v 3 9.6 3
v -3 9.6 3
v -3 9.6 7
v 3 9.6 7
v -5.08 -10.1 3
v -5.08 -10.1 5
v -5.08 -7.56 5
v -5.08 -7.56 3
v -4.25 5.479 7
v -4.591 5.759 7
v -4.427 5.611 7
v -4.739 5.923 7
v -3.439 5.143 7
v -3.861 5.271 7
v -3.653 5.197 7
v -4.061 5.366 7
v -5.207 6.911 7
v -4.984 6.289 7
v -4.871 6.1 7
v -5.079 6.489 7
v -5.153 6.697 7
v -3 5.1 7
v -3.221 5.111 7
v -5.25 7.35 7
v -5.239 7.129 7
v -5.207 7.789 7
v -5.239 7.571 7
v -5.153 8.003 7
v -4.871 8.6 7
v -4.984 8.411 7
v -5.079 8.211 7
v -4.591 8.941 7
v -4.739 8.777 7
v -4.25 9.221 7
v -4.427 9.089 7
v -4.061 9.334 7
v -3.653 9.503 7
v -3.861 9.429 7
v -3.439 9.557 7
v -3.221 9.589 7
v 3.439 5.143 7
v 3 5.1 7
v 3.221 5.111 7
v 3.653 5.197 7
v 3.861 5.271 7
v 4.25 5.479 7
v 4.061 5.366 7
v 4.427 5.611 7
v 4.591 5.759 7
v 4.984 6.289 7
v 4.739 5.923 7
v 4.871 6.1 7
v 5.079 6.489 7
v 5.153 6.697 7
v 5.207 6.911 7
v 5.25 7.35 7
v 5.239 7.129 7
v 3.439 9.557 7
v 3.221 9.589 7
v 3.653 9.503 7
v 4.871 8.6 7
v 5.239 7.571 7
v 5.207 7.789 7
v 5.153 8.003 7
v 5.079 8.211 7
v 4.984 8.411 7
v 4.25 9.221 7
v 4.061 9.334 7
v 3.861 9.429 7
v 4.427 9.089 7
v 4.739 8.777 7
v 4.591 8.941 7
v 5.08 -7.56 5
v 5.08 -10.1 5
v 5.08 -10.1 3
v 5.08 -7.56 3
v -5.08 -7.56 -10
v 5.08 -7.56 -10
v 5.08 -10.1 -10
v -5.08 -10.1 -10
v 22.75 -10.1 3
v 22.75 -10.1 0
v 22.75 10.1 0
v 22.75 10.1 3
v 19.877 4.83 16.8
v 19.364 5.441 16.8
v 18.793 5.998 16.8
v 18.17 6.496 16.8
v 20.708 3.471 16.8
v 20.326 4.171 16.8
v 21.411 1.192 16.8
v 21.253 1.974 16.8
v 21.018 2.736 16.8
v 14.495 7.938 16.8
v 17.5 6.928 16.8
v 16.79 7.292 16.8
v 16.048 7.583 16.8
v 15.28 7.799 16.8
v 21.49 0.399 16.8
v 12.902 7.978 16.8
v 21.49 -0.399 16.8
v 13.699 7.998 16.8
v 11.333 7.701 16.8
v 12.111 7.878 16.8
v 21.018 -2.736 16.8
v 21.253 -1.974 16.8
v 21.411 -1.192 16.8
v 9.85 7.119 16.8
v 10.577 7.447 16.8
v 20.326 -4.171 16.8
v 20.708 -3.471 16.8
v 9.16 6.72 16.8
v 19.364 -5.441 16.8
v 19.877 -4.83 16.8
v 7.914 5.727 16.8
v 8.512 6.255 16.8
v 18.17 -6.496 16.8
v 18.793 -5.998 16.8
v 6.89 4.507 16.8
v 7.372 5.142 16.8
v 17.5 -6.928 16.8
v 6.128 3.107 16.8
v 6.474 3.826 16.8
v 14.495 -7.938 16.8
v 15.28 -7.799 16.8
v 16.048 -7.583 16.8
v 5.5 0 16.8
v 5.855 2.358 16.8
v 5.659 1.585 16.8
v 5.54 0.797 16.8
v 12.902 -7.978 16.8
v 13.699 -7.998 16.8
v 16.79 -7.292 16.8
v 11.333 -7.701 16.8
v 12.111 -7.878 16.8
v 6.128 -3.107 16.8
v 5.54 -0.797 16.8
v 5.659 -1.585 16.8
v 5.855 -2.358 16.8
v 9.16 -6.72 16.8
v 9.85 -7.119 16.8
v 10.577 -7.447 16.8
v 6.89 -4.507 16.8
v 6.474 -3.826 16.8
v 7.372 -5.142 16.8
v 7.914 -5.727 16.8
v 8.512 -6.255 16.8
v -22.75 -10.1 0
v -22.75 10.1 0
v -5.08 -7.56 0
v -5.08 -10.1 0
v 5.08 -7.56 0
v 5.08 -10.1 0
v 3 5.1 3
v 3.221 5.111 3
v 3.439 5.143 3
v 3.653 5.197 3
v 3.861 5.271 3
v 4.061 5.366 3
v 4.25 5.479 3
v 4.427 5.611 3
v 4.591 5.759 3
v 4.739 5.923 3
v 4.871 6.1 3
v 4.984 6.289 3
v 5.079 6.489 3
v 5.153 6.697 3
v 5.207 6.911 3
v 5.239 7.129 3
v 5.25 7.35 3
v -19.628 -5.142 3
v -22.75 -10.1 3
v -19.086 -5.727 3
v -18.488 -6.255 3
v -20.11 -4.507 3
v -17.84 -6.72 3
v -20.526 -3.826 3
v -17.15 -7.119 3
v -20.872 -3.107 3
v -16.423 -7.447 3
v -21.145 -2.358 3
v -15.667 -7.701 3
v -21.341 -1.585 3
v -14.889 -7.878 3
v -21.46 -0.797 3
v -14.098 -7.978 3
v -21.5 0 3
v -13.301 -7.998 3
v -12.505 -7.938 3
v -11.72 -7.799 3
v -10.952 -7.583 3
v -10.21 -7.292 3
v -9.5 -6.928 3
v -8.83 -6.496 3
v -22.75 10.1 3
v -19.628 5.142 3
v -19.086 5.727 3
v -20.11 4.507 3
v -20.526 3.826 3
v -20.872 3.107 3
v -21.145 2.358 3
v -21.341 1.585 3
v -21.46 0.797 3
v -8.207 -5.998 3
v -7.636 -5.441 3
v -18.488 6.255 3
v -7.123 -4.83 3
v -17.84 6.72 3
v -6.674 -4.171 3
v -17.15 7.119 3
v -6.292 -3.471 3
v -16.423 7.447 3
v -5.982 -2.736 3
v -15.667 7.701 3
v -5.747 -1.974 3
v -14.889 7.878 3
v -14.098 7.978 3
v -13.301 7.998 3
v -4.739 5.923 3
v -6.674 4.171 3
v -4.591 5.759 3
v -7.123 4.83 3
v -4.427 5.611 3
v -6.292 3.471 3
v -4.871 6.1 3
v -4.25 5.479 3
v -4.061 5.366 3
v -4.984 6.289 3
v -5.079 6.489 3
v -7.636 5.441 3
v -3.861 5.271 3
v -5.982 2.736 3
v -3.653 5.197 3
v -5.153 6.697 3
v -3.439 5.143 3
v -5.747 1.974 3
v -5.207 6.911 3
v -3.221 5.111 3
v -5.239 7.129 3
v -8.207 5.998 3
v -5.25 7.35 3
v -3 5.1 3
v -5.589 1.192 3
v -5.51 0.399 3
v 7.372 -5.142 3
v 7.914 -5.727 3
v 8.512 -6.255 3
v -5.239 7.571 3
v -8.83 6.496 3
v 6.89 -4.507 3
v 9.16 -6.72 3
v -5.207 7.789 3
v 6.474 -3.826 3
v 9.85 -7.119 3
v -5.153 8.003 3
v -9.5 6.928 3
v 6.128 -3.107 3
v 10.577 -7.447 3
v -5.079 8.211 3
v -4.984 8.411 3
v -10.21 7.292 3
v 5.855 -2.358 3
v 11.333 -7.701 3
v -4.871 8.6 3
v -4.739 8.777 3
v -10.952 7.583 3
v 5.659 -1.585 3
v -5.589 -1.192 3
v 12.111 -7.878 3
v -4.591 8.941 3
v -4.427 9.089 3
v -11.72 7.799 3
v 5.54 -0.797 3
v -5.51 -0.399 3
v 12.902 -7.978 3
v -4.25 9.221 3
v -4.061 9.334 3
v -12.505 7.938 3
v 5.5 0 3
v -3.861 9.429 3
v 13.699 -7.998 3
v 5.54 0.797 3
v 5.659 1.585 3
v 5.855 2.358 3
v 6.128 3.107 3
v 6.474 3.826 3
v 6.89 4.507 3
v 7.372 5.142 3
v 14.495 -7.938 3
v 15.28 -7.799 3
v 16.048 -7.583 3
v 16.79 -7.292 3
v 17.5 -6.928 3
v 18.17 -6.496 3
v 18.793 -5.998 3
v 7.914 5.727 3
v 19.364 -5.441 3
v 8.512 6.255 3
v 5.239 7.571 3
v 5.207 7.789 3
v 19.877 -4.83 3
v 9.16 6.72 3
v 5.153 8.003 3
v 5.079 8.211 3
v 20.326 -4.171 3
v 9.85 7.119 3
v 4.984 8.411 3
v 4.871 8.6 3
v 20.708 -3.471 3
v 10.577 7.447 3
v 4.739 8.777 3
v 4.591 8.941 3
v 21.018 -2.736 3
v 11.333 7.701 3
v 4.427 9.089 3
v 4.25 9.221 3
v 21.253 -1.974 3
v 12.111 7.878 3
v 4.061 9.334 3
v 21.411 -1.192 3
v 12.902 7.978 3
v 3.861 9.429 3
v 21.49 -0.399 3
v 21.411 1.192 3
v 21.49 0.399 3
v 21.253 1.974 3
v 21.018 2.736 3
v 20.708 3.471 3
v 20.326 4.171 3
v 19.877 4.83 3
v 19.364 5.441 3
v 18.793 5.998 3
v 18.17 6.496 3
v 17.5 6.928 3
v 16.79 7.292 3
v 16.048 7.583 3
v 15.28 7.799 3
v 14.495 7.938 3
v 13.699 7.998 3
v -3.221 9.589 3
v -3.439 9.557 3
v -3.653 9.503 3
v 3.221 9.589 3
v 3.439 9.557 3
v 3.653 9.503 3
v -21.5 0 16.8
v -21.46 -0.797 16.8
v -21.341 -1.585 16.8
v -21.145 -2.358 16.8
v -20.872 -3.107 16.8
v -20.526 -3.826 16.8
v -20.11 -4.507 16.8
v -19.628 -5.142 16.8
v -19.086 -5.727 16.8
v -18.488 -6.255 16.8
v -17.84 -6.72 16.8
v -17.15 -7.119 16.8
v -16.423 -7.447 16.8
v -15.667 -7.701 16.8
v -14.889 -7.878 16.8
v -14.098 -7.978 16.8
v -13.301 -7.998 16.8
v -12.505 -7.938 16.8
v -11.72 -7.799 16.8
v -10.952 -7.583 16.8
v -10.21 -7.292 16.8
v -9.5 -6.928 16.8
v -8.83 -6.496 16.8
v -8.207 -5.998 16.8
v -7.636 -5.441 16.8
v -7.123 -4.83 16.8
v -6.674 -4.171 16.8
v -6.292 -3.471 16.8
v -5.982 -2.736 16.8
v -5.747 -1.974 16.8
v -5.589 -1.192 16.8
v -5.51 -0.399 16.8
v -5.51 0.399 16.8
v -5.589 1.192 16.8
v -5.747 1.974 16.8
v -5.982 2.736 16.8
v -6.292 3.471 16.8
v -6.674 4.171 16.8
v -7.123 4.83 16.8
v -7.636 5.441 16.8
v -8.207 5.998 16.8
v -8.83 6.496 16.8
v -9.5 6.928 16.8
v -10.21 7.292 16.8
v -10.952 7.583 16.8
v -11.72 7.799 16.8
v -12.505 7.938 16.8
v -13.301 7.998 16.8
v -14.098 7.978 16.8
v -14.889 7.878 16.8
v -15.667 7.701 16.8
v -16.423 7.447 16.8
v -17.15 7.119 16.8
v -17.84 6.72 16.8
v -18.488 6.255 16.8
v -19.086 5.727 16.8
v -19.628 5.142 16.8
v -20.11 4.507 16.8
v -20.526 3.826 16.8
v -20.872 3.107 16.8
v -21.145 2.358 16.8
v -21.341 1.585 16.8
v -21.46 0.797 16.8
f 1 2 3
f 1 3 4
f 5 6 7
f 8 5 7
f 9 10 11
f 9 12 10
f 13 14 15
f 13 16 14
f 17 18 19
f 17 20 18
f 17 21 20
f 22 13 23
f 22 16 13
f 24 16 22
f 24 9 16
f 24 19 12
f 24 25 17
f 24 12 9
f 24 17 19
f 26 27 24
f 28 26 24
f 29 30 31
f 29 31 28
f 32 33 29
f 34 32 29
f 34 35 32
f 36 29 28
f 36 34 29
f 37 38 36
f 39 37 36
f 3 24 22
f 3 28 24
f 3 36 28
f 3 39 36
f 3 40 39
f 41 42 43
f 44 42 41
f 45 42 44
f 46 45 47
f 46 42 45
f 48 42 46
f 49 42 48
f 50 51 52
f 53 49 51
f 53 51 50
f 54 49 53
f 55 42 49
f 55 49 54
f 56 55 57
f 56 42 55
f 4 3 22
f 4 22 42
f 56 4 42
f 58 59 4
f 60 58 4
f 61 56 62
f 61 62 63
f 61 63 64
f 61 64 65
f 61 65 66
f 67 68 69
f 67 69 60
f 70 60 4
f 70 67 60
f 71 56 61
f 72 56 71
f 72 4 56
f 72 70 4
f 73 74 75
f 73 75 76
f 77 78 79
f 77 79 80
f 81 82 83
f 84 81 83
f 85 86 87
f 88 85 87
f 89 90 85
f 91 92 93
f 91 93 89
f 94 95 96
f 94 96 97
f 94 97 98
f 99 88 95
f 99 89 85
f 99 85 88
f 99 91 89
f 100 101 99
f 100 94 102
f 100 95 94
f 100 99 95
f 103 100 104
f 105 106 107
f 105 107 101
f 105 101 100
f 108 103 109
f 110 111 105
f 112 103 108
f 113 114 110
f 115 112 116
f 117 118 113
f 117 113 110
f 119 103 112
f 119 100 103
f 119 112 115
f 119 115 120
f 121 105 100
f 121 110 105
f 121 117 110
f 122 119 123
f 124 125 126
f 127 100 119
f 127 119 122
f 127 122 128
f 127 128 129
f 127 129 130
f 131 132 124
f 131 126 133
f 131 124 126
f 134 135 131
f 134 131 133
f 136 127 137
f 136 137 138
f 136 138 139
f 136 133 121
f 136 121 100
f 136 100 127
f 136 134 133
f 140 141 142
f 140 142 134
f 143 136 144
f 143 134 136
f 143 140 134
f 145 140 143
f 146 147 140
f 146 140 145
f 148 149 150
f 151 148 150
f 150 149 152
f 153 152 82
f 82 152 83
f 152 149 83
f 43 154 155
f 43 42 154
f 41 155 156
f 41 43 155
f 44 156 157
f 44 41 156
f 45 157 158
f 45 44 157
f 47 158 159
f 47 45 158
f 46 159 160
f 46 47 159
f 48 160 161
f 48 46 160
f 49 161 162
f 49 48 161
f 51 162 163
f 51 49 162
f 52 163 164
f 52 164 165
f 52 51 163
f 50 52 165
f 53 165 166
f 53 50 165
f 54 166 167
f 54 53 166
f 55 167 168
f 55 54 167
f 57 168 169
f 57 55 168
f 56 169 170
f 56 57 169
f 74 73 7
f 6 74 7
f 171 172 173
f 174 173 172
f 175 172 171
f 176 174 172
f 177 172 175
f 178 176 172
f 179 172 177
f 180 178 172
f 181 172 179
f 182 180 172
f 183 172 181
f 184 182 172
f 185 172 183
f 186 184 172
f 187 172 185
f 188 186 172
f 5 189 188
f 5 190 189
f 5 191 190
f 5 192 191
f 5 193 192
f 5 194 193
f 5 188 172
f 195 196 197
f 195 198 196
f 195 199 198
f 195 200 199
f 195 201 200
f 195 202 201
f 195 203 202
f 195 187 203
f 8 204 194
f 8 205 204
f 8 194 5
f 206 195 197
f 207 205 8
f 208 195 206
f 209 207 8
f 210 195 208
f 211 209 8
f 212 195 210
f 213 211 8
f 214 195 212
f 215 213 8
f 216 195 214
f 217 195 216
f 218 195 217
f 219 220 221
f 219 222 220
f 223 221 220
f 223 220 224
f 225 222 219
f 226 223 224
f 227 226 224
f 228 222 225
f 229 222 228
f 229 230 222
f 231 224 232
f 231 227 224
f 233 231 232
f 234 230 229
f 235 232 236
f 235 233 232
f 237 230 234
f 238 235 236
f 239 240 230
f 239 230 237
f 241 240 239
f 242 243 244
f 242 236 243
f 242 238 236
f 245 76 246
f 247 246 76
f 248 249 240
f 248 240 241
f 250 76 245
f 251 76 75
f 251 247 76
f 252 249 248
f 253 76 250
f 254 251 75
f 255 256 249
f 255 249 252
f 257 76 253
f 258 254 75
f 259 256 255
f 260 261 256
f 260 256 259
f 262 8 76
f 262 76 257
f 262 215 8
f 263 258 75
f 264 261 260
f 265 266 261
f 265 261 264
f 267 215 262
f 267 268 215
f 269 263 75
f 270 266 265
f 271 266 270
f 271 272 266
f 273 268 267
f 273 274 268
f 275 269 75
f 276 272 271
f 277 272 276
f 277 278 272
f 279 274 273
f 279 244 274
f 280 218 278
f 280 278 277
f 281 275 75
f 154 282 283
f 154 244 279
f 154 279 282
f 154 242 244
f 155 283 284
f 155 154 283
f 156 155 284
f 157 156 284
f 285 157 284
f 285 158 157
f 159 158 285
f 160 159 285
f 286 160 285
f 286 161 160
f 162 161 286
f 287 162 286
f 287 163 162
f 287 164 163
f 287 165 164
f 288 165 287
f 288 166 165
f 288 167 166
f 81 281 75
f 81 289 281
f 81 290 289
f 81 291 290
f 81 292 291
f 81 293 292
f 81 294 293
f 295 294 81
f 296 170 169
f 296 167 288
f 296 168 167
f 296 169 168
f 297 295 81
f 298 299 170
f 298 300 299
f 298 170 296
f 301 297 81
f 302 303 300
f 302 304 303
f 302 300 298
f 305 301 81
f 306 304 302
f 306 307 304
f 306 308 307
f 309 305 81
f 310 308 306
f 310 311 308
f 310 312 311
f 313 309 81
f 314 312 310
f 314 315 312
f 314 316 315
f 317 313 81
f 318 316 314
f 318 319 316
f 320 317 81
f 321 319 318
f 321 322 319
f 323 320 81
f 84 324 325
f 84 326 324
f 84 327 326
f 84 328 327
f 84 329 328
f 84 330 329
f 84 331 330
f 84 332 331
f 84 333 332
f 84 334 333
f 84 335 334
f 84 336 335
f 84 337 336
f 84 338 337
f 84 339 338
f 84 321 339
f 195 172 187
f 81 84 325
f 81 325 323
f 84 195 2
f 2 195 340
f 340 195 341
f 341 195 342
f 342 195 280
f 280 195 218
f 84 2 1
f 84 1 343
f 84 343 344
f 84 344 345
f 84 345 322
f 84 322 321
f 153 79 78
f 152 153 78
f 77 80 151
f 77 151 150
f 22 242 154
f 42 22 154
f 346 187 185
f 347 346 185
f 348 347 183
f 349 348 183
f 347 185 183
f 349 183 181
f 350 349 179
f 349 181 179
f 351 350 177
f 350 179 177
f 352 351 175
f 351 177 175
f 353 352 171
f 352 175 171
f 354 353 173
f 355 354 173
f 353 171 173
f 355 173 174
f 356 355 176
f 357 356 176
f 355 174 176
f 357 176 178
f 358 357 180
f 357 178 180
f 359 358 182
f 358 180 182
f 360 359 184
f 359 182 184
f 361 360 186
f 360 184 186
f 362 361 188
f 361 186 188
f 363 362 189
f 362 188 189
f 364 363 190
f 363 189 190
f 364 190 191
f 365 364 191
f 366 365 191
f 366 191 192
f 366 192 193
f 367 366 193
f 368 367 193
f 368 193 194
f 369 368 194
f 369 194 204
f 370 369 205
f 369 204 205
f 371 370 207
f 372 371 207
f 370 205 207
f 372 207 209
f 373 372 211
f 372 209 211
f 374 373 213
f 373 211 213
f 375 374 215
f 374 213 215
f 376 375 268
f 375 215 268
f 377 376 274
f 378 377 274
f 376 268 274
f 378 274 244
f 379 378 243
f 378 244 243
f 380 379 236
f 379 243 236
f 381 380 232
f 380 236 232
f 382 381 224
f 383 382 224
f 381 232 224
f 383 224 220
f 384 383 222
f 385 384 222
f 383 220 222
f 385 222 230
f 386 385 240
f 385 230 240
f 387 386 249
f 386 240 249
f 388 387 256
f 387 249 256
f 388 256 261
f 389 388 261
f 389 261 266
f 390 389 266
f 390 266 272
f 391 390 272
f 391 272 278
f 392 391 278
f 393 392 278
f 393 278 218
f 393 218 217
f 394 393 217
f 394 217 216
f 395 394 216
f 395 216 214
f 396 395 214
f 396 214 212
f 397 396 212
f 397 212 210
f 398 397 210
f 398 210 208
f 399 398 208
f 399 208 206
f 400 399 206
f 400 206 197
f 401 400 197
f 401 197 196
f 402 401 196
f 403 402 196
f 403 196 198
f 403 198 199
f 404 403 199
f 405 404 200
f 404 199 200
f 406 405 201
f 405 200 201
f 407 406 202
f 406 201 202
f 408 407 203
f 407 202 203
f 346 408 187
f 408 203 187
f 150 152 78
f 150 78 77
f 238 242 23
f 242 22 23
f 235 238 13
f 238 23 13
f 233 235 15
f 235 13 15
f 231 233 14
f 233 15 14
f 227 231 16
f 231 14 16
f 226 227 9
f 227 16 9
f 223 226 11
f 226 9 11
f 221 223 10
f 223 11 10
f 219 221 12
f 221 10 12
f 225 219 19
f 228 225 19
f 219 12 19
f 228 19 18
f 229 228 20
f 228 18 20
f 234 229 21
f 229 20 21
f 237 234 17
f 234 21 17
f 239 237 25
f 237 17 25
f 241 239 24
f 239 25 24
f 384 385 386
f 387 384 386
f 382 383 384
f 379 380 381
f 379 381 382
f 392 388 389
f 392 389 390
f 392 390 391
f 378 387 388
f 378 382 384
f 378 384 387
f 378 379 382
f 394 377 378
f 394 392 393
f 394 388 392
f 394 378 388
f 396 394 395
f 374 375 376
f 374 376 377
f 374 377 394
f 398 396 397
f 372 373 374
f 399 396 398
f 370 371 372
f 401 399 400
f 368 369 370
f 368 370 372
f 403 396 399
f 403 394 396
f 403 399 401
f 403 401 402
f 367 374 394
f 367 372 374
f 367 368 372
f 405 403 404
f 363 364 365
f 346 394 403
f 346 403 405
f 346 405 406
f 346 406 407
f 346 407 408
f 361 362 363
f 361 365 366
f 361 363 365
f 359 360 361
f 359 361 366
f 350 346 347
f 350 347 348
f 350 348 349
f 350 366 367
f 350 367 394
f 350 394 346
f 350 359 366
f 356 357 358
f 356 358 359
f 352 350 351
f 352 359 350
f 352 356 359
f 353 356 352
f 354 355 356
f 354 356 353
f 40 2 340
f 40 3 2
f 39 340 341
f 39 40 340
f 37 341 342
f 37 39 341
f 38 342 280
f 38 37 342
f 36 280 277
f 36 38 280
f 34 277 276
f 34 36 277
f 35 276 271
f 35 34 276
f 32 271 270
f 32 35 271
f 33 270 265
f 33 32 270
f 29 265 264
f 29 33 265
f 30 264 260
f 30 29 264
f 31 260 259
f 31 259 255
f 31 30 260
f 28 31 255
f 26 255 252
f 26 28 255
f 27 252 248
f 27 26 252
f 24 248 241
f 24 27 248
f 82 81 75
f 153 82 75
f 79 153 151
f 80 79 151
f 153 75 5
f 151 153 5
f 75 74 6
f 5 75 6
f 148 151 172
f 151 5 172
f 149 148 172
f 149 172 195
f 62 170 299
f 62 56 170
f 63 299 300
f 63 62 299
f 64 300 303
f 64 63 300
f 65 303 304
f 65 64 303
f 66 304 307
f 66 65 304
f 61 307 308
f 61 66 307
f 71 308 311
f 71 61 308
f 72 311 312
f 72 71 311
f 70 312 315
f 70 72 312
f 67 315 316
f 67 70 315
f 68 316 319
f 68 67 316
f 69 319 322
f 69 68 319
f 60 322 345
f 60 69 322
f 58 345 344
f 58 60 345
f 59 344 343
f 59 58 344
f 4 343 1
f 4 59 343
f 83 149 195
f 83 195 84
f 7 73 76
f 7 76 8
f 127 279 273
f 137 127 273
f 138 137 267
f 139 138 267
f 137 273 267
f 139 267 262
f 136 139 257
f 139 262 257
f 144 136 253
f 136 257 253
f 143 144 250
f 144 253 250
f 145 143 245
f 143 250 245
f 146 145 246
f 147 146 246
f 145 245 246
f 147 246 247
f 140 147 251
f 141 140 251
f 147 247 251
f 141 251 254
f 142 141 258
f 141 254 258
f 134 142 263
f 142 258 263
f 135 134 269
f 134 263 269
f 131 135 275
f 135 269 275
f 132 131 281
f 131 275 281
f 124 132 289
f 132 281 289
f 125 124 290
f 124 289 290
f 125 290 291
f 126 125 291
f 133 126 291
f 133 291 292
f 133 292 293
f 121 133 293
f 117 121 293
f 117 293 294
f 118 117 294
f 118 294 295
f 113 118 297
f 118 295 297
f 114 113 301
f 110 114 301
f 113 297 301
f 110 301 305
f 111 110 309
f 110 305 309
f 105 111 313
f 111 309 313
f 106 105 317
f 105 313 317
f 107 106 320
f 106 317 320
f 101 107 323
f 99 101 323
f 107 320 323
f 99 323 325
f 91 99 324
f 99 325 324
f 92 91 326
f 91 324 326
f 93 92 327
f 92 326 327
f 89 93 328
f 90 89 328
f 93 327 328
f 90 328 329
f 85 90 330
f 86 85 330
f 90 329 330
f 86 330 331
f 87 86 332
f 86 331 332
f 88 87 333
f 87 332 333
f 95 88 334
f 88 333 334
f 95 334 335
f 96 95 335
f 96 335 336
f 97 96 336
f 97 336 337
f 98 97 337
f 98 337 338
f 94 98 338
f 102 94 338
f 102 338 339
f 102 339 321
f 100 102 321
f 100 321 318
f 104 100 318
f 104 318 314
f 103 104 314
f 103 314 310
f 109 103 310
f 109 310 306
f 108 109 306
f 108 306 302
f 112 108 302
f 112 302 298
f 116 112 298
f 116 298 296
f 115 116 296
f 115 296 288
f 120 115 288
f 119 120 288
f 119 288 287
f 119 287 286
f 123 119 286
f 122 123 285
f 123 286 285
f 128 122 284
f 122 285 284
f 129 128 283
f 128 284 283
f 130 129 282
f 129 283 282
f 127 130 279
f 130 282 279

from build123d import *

# Parameters (mm, degrees)
SKETCH1_W                = 45.5
SKETCH1_H                = 20.2
BOSS_EXTRUDE1_DEPTH      = 3
SKETCH2_R                = 8
BOSS_EXTRUDE2_DEPTH      = 13.8
SKETCH3_W                = 10.5
SKETCH3_H                = 4.5
BOSS_EXTRUDE3_DEPTH      = 4
FILLET1_R                = 2.25
BOSS_EXTRUDE4_DEPTH      = 10
BOSS_EXTRUDE4_DEPTH_BACK = 5
SKETCH4_W                = 10.16
SKETCH4_H                = 2.54


with BuildPart() as part:
    # Sketch1 → Boss-Extrude1 (new body)
    with BuildSketch(Plane.XY):
        Rectangle(SKETCH1_W, SKETCH1_H)
    extrude(amount=BOSS_EXTRUDE1_DEPTH)

    # Sketch2 → Boss-Extrude2 (add)
    with BuildSketch(Plane.XY.offset(3)):
        with Locations(Location((-13.5, 0, 0), (0, 0, 180))):
            Circle(SKETCH2_R)
        with Locations(Location((13.5, 0, 0), (0, 0, 180))):
            Circle(SKETCH2_R)
    extrude(amount=BOSS_EXTRUDE2_DEPTH)

    # Sketch3 → Boss-Extrude3 (add)
    with BuildSketch(Plane.XY.offset(3)):
        with Locations((0, 7.35)):
            Rectangle(SKETCH3_W, SKETCH3_H)
    extrude(amount=BOSS_EXTRUDE3_DEPTH)

    # Fillet1
    fillet1_edges = [part.edges().sort_by_distance(p)[0] for p in [
        (-5.25, 5.1, 5),
        (-5.25, 9.6, 5),
        (5.25, 5.1, 5),
        (5.25, 9.6, 5),
    ]]
    fillet(fillet1_edges, radius=FILLET1_R - 0.0001)  # a hair under: the kernel refuses the full size

    # Sketch4 → Boss-Extrude4 (add, two sides: drawn at the far end of the back side and taken through both)
    with BuildSketch(Plane(origin=(0, 0, 0), x_dir=(-1, 0, 0), z_dir=(0, 0, -1)).offset(-BOSS_EXTRUDE4_DEPTH_BACK)):
        with Locations((0, -8.83)):
            Rectangle(SKETCH4_W, SKETCH4_H)
    extrude(amount=BOSS_EXTRUDE4_DEPTH + BOSS_EXTRUDE4_DEPTH_BACK)


solid = part.part
